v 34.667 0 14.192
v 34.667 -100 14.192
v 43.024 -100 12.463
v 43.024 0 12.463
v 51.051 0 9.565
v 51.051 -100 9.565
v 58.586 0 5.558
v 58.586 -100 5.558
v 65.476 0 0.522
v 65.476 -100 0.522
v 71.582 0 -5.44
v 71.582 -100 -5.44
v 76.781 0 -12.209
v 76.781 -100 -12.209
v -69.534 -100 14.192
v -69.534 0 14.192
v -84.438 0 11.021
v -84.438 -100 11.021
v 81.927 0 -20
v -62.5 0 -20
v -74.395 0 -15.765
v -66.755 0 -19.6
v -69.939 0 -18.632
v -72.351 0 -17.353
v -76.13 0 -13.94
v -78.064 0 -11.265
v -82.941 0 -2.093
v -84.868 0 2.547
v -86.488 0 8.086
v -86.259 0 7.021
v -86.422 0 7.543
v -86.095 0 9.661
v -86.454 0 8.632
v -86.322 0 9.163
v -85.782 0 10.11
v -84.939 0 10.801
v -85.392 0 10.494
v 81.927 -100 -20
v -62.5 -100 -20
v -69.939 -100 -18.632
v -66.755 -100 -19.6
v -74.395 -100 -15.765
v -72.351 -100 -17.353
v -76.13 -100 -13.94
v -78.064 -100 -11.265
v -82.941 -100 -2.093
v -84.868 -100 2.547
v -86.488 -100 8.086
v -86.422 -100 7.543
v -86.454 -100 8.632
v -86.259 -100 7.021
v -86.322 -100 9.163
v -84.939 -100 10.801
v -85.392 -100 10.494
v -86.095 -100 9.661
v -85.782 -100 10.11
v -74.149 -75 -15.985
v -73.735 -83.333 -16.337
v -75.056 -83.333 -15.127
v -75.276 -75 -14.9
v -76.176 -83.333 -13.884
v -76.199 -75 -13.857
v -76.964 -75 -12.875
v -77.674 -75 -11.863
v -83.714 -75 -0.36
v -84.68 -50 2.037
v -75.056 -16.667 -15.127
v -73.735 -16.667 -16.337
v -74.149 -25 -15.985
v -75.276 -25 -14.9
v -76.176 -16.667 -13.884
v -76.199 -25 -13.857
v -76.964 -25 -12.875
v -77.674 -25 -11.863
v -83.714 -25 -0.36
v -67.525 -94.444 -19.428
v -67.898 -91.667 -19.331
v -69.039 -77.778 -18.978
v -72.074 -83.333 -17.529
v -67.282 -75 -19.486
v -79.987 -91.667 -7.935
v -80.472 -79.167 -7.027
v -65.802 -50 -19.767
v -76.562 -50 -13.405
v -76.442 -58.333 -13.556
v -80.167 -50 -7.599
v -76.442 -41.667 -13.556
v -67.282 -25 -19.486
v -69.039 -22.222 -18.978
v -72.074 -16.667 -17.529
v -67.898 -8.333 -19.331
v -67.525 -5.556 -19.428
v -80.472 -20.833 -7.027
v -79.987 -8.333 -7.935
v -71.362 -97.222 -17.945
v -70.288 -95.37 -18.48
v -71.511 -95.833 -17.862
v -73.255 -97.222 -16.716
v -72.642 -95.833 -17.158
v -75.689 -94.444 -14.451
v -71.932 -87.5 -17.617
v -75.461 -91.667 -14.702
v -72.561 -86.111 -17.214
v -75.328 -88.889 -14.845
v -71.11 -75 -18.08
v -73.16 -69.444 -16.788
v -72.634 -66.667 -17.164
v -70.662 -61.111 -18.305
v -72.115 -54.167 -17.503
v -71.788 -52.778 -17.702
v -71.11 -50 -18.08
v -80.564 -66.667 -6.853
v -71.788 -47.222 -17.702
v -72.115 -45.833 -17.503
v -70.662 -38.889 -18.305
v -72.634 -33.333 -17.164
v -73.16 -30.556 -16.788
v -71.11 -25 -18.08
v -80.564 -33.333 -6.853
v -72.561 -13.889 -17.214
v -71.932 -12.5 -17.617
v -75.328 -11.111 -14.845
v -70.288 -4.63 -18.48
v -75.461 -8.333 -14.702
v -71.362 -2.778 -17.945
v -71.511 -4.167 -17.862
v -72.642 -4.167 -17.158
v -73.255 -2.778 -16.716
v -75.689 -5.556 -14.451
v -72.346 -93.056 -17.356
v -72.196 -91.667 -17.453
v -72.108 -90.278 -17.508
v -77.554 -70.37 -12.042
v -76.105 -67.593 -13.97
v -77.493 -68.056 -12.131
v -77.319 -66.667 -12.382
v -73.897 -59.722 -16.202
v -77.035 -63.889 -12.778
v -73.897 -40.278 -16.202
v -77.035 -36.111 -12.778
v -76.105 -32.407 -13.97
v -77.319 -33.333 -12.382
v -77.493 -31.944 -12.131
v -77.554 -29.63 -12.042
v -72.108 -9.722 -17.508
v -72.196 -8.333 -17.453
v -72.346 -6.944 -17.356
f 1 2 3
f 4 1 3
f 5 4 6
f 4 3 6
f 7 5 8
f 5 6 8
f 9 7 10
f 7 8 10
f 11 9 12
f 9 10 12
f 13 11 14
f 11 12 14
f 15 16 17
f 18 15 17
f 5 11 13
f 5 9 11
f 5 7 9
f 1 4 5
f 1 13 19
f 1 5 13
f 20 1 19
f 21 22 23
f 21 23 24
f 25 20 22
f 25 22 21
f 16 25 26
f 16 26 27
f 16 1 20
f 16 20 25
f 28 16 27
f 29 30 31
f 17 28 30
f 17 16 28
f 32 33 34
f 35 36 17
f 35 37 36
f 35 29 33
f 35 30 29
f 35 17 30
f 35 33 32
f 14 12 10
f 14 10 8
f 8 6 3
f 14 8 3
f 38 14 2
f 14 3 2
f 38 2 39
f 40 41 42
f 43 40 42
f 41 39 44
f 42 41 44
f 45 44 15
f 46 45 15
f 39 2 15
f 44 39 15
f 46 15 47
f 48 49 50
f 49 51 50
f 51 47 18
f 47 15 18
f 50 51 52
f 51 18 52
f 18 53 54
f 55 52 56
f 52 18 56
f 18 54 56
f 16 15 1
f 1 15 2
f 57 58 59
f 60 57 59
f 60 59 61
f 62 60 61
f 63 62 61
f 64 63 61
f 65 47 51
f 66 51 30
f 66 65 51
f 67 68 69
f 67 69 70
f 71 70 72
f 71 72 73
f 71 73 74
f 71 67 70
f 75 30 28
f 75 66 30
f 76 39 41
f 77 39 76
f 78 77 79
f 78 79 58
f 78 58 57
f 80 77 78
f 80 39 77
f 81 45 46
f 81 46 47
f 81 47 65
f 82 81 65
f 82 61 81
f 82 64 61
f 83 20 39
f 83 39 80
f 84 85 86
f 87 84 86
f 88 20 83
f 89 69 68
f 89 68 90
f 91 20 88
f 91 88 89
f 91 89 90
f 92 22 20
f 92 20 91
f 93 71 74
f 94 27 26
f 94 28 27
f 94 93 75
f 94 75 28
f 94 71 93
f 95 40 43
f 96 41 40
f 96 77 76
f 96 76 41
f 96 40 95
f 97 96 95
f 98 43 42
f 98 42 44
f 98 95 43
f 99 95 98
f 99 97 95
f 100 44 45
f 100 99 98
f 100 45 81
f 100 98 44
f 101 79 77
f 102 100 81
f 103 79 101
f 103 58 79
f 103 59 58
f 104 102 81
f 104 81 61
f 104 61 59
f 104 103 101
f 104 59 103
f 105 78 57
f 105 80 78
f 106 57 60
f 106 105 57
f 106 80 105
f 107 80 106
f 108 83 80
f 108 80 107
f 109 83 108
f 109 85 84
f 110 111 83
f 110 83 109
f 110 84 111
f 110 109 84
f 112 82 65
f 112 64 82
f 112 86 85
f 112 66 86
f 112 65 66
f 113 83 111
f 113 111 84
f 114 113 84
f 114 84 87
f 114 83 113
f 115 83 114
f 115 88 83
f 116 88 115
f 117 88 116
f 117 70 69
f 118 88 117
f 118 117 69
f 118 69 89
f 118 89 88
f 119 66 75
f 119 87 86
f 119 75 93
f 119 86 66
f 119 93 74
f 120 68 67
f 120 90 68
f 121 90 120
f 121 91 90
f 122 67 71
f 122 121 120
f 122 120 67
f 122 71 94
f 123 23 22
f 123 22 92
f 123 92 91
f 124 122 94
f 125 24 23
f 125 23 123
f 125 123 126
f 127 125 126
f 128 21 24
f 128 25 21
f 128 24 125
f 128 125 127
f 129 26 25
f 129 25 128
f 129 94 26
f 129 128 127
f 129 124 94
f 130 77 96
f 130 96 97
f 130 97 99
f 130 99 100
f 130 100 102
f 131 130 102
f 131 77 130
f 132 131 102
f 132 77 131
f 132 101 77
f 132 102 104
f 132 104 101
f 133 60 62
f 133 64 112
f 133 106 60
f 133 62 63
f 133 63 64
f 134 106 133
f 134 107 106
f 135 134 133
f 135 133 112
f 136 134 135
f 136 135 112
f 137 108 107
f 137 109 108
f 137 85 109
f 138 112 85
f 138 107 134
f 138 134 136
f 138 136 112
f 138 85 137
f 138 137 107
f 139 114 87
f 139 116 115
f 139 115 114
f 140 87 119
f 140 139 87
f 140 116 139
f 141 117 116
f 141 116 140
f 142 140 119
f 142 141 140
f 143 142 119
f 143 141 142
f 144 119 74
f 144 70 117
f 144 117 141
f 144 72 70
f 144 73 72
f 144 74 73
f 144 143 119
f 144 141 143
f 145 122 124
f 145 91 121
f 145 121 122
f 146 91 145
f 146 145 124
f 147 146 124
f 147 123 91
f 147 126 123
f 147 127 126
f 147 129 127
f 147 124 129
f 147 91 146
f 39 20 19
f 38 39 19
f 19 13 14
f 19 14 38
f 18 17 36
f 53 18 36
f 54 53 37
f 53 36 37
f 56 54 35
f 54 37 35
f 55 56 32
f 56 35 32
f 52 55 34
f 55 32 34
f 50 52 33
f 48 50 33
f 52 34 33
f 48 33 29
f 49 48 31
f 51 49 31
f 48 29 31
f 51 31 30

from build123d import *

# Parameters (mm, degrees)
F1_DEPTH = 100
F3_DEPTH = 100.0010001


with BuildPart() as f1:
    # F0 (on Front) → F1 (new body)
    with BuildSketch(Plane.XZ):
        with BuildLine():
            add(Edge.make_bspline(
                [(-62.5, -20), (-73.1268525124, -20), (-80.4059031562, -7.7978468302), (-84.9233715293, 1.839947371), (-86.2586413814, 7.0207393153)],
                knots=[0, 0, 0, 0, 0.5386149438, 1, 1, 1, 1], degree=3))
            Line((-62.5, -20), (81.9273708606, -20))
            ThreePointArc((81.9273708606, -20), (85.2753510448, -18.1888418596), (85.5914704468, -14.3955143432))
            add(Edge.make_bspline(
                [(85.5914704468, -14.3955143432), (80.4923521492, -2.7508622611), (61.7807143057, 13.6061614536), (50.4547609094, 18.5615463365), (-2.3409408703, 16.1806235265), (-42.1157825532, 18.1611356538), (-69.9472957559, 14.7146056584), (-84.4380939102, 11.0206353633)],
                knots=[0.0286493497, 0.0286493497, 0.0286493497, 0.0286493497, 0.2113092276, 0.3338194515, 0.5678984107, 0.7846695753, 1, 1, 1, 1], degree=3))
            ThreePointArc((-84.4380939102, 11.0206353633), (-86.219889206, 9.4173592411), (-86.2586413814, 7.0207393153))
        make_face()
    extrude(amount=F1_DEPTH)

    # F2 (on face) → F3 (cut, through all)
    with BuildSketch(Plane.XZ.offset(100)):
        with BuildLine():
            Line((76.7807810103, -12.2087626863), (81.9273708606, -20))
            Line((81.9273708606, -20), (89.4811376929, -23.3435314149))
            Line((89.4811376929, -23.3435314149), (91.3648977876, -5.6361360475))
            Line((91.3648977876, -5.6361360475), (72.1504986286, 22.6203482598))
            Line((72.1504986286, 22.6203482598), (18.2747989893, 25.8227474988))
            Line((18.2747989893, 25.8227474988), (-74.9715939164, 17.3458047211))
            Line((-74.9715939164, 17.3458047211), (-69.5344796887, 14.1921793268))
            Line((-69.5344796887, 14.1921793268), (34.6666465938, 14.1921793268))
            ThreePointArc((34.6666465938, 14.1921793268), (58.5861493226, 5.5577951747), (76.7807810103, -12.2087626863))
        make_face()
    extrude(amount=-F3_DEPTH, mode=Mode.SUBTRACT)


solid = f1.part
